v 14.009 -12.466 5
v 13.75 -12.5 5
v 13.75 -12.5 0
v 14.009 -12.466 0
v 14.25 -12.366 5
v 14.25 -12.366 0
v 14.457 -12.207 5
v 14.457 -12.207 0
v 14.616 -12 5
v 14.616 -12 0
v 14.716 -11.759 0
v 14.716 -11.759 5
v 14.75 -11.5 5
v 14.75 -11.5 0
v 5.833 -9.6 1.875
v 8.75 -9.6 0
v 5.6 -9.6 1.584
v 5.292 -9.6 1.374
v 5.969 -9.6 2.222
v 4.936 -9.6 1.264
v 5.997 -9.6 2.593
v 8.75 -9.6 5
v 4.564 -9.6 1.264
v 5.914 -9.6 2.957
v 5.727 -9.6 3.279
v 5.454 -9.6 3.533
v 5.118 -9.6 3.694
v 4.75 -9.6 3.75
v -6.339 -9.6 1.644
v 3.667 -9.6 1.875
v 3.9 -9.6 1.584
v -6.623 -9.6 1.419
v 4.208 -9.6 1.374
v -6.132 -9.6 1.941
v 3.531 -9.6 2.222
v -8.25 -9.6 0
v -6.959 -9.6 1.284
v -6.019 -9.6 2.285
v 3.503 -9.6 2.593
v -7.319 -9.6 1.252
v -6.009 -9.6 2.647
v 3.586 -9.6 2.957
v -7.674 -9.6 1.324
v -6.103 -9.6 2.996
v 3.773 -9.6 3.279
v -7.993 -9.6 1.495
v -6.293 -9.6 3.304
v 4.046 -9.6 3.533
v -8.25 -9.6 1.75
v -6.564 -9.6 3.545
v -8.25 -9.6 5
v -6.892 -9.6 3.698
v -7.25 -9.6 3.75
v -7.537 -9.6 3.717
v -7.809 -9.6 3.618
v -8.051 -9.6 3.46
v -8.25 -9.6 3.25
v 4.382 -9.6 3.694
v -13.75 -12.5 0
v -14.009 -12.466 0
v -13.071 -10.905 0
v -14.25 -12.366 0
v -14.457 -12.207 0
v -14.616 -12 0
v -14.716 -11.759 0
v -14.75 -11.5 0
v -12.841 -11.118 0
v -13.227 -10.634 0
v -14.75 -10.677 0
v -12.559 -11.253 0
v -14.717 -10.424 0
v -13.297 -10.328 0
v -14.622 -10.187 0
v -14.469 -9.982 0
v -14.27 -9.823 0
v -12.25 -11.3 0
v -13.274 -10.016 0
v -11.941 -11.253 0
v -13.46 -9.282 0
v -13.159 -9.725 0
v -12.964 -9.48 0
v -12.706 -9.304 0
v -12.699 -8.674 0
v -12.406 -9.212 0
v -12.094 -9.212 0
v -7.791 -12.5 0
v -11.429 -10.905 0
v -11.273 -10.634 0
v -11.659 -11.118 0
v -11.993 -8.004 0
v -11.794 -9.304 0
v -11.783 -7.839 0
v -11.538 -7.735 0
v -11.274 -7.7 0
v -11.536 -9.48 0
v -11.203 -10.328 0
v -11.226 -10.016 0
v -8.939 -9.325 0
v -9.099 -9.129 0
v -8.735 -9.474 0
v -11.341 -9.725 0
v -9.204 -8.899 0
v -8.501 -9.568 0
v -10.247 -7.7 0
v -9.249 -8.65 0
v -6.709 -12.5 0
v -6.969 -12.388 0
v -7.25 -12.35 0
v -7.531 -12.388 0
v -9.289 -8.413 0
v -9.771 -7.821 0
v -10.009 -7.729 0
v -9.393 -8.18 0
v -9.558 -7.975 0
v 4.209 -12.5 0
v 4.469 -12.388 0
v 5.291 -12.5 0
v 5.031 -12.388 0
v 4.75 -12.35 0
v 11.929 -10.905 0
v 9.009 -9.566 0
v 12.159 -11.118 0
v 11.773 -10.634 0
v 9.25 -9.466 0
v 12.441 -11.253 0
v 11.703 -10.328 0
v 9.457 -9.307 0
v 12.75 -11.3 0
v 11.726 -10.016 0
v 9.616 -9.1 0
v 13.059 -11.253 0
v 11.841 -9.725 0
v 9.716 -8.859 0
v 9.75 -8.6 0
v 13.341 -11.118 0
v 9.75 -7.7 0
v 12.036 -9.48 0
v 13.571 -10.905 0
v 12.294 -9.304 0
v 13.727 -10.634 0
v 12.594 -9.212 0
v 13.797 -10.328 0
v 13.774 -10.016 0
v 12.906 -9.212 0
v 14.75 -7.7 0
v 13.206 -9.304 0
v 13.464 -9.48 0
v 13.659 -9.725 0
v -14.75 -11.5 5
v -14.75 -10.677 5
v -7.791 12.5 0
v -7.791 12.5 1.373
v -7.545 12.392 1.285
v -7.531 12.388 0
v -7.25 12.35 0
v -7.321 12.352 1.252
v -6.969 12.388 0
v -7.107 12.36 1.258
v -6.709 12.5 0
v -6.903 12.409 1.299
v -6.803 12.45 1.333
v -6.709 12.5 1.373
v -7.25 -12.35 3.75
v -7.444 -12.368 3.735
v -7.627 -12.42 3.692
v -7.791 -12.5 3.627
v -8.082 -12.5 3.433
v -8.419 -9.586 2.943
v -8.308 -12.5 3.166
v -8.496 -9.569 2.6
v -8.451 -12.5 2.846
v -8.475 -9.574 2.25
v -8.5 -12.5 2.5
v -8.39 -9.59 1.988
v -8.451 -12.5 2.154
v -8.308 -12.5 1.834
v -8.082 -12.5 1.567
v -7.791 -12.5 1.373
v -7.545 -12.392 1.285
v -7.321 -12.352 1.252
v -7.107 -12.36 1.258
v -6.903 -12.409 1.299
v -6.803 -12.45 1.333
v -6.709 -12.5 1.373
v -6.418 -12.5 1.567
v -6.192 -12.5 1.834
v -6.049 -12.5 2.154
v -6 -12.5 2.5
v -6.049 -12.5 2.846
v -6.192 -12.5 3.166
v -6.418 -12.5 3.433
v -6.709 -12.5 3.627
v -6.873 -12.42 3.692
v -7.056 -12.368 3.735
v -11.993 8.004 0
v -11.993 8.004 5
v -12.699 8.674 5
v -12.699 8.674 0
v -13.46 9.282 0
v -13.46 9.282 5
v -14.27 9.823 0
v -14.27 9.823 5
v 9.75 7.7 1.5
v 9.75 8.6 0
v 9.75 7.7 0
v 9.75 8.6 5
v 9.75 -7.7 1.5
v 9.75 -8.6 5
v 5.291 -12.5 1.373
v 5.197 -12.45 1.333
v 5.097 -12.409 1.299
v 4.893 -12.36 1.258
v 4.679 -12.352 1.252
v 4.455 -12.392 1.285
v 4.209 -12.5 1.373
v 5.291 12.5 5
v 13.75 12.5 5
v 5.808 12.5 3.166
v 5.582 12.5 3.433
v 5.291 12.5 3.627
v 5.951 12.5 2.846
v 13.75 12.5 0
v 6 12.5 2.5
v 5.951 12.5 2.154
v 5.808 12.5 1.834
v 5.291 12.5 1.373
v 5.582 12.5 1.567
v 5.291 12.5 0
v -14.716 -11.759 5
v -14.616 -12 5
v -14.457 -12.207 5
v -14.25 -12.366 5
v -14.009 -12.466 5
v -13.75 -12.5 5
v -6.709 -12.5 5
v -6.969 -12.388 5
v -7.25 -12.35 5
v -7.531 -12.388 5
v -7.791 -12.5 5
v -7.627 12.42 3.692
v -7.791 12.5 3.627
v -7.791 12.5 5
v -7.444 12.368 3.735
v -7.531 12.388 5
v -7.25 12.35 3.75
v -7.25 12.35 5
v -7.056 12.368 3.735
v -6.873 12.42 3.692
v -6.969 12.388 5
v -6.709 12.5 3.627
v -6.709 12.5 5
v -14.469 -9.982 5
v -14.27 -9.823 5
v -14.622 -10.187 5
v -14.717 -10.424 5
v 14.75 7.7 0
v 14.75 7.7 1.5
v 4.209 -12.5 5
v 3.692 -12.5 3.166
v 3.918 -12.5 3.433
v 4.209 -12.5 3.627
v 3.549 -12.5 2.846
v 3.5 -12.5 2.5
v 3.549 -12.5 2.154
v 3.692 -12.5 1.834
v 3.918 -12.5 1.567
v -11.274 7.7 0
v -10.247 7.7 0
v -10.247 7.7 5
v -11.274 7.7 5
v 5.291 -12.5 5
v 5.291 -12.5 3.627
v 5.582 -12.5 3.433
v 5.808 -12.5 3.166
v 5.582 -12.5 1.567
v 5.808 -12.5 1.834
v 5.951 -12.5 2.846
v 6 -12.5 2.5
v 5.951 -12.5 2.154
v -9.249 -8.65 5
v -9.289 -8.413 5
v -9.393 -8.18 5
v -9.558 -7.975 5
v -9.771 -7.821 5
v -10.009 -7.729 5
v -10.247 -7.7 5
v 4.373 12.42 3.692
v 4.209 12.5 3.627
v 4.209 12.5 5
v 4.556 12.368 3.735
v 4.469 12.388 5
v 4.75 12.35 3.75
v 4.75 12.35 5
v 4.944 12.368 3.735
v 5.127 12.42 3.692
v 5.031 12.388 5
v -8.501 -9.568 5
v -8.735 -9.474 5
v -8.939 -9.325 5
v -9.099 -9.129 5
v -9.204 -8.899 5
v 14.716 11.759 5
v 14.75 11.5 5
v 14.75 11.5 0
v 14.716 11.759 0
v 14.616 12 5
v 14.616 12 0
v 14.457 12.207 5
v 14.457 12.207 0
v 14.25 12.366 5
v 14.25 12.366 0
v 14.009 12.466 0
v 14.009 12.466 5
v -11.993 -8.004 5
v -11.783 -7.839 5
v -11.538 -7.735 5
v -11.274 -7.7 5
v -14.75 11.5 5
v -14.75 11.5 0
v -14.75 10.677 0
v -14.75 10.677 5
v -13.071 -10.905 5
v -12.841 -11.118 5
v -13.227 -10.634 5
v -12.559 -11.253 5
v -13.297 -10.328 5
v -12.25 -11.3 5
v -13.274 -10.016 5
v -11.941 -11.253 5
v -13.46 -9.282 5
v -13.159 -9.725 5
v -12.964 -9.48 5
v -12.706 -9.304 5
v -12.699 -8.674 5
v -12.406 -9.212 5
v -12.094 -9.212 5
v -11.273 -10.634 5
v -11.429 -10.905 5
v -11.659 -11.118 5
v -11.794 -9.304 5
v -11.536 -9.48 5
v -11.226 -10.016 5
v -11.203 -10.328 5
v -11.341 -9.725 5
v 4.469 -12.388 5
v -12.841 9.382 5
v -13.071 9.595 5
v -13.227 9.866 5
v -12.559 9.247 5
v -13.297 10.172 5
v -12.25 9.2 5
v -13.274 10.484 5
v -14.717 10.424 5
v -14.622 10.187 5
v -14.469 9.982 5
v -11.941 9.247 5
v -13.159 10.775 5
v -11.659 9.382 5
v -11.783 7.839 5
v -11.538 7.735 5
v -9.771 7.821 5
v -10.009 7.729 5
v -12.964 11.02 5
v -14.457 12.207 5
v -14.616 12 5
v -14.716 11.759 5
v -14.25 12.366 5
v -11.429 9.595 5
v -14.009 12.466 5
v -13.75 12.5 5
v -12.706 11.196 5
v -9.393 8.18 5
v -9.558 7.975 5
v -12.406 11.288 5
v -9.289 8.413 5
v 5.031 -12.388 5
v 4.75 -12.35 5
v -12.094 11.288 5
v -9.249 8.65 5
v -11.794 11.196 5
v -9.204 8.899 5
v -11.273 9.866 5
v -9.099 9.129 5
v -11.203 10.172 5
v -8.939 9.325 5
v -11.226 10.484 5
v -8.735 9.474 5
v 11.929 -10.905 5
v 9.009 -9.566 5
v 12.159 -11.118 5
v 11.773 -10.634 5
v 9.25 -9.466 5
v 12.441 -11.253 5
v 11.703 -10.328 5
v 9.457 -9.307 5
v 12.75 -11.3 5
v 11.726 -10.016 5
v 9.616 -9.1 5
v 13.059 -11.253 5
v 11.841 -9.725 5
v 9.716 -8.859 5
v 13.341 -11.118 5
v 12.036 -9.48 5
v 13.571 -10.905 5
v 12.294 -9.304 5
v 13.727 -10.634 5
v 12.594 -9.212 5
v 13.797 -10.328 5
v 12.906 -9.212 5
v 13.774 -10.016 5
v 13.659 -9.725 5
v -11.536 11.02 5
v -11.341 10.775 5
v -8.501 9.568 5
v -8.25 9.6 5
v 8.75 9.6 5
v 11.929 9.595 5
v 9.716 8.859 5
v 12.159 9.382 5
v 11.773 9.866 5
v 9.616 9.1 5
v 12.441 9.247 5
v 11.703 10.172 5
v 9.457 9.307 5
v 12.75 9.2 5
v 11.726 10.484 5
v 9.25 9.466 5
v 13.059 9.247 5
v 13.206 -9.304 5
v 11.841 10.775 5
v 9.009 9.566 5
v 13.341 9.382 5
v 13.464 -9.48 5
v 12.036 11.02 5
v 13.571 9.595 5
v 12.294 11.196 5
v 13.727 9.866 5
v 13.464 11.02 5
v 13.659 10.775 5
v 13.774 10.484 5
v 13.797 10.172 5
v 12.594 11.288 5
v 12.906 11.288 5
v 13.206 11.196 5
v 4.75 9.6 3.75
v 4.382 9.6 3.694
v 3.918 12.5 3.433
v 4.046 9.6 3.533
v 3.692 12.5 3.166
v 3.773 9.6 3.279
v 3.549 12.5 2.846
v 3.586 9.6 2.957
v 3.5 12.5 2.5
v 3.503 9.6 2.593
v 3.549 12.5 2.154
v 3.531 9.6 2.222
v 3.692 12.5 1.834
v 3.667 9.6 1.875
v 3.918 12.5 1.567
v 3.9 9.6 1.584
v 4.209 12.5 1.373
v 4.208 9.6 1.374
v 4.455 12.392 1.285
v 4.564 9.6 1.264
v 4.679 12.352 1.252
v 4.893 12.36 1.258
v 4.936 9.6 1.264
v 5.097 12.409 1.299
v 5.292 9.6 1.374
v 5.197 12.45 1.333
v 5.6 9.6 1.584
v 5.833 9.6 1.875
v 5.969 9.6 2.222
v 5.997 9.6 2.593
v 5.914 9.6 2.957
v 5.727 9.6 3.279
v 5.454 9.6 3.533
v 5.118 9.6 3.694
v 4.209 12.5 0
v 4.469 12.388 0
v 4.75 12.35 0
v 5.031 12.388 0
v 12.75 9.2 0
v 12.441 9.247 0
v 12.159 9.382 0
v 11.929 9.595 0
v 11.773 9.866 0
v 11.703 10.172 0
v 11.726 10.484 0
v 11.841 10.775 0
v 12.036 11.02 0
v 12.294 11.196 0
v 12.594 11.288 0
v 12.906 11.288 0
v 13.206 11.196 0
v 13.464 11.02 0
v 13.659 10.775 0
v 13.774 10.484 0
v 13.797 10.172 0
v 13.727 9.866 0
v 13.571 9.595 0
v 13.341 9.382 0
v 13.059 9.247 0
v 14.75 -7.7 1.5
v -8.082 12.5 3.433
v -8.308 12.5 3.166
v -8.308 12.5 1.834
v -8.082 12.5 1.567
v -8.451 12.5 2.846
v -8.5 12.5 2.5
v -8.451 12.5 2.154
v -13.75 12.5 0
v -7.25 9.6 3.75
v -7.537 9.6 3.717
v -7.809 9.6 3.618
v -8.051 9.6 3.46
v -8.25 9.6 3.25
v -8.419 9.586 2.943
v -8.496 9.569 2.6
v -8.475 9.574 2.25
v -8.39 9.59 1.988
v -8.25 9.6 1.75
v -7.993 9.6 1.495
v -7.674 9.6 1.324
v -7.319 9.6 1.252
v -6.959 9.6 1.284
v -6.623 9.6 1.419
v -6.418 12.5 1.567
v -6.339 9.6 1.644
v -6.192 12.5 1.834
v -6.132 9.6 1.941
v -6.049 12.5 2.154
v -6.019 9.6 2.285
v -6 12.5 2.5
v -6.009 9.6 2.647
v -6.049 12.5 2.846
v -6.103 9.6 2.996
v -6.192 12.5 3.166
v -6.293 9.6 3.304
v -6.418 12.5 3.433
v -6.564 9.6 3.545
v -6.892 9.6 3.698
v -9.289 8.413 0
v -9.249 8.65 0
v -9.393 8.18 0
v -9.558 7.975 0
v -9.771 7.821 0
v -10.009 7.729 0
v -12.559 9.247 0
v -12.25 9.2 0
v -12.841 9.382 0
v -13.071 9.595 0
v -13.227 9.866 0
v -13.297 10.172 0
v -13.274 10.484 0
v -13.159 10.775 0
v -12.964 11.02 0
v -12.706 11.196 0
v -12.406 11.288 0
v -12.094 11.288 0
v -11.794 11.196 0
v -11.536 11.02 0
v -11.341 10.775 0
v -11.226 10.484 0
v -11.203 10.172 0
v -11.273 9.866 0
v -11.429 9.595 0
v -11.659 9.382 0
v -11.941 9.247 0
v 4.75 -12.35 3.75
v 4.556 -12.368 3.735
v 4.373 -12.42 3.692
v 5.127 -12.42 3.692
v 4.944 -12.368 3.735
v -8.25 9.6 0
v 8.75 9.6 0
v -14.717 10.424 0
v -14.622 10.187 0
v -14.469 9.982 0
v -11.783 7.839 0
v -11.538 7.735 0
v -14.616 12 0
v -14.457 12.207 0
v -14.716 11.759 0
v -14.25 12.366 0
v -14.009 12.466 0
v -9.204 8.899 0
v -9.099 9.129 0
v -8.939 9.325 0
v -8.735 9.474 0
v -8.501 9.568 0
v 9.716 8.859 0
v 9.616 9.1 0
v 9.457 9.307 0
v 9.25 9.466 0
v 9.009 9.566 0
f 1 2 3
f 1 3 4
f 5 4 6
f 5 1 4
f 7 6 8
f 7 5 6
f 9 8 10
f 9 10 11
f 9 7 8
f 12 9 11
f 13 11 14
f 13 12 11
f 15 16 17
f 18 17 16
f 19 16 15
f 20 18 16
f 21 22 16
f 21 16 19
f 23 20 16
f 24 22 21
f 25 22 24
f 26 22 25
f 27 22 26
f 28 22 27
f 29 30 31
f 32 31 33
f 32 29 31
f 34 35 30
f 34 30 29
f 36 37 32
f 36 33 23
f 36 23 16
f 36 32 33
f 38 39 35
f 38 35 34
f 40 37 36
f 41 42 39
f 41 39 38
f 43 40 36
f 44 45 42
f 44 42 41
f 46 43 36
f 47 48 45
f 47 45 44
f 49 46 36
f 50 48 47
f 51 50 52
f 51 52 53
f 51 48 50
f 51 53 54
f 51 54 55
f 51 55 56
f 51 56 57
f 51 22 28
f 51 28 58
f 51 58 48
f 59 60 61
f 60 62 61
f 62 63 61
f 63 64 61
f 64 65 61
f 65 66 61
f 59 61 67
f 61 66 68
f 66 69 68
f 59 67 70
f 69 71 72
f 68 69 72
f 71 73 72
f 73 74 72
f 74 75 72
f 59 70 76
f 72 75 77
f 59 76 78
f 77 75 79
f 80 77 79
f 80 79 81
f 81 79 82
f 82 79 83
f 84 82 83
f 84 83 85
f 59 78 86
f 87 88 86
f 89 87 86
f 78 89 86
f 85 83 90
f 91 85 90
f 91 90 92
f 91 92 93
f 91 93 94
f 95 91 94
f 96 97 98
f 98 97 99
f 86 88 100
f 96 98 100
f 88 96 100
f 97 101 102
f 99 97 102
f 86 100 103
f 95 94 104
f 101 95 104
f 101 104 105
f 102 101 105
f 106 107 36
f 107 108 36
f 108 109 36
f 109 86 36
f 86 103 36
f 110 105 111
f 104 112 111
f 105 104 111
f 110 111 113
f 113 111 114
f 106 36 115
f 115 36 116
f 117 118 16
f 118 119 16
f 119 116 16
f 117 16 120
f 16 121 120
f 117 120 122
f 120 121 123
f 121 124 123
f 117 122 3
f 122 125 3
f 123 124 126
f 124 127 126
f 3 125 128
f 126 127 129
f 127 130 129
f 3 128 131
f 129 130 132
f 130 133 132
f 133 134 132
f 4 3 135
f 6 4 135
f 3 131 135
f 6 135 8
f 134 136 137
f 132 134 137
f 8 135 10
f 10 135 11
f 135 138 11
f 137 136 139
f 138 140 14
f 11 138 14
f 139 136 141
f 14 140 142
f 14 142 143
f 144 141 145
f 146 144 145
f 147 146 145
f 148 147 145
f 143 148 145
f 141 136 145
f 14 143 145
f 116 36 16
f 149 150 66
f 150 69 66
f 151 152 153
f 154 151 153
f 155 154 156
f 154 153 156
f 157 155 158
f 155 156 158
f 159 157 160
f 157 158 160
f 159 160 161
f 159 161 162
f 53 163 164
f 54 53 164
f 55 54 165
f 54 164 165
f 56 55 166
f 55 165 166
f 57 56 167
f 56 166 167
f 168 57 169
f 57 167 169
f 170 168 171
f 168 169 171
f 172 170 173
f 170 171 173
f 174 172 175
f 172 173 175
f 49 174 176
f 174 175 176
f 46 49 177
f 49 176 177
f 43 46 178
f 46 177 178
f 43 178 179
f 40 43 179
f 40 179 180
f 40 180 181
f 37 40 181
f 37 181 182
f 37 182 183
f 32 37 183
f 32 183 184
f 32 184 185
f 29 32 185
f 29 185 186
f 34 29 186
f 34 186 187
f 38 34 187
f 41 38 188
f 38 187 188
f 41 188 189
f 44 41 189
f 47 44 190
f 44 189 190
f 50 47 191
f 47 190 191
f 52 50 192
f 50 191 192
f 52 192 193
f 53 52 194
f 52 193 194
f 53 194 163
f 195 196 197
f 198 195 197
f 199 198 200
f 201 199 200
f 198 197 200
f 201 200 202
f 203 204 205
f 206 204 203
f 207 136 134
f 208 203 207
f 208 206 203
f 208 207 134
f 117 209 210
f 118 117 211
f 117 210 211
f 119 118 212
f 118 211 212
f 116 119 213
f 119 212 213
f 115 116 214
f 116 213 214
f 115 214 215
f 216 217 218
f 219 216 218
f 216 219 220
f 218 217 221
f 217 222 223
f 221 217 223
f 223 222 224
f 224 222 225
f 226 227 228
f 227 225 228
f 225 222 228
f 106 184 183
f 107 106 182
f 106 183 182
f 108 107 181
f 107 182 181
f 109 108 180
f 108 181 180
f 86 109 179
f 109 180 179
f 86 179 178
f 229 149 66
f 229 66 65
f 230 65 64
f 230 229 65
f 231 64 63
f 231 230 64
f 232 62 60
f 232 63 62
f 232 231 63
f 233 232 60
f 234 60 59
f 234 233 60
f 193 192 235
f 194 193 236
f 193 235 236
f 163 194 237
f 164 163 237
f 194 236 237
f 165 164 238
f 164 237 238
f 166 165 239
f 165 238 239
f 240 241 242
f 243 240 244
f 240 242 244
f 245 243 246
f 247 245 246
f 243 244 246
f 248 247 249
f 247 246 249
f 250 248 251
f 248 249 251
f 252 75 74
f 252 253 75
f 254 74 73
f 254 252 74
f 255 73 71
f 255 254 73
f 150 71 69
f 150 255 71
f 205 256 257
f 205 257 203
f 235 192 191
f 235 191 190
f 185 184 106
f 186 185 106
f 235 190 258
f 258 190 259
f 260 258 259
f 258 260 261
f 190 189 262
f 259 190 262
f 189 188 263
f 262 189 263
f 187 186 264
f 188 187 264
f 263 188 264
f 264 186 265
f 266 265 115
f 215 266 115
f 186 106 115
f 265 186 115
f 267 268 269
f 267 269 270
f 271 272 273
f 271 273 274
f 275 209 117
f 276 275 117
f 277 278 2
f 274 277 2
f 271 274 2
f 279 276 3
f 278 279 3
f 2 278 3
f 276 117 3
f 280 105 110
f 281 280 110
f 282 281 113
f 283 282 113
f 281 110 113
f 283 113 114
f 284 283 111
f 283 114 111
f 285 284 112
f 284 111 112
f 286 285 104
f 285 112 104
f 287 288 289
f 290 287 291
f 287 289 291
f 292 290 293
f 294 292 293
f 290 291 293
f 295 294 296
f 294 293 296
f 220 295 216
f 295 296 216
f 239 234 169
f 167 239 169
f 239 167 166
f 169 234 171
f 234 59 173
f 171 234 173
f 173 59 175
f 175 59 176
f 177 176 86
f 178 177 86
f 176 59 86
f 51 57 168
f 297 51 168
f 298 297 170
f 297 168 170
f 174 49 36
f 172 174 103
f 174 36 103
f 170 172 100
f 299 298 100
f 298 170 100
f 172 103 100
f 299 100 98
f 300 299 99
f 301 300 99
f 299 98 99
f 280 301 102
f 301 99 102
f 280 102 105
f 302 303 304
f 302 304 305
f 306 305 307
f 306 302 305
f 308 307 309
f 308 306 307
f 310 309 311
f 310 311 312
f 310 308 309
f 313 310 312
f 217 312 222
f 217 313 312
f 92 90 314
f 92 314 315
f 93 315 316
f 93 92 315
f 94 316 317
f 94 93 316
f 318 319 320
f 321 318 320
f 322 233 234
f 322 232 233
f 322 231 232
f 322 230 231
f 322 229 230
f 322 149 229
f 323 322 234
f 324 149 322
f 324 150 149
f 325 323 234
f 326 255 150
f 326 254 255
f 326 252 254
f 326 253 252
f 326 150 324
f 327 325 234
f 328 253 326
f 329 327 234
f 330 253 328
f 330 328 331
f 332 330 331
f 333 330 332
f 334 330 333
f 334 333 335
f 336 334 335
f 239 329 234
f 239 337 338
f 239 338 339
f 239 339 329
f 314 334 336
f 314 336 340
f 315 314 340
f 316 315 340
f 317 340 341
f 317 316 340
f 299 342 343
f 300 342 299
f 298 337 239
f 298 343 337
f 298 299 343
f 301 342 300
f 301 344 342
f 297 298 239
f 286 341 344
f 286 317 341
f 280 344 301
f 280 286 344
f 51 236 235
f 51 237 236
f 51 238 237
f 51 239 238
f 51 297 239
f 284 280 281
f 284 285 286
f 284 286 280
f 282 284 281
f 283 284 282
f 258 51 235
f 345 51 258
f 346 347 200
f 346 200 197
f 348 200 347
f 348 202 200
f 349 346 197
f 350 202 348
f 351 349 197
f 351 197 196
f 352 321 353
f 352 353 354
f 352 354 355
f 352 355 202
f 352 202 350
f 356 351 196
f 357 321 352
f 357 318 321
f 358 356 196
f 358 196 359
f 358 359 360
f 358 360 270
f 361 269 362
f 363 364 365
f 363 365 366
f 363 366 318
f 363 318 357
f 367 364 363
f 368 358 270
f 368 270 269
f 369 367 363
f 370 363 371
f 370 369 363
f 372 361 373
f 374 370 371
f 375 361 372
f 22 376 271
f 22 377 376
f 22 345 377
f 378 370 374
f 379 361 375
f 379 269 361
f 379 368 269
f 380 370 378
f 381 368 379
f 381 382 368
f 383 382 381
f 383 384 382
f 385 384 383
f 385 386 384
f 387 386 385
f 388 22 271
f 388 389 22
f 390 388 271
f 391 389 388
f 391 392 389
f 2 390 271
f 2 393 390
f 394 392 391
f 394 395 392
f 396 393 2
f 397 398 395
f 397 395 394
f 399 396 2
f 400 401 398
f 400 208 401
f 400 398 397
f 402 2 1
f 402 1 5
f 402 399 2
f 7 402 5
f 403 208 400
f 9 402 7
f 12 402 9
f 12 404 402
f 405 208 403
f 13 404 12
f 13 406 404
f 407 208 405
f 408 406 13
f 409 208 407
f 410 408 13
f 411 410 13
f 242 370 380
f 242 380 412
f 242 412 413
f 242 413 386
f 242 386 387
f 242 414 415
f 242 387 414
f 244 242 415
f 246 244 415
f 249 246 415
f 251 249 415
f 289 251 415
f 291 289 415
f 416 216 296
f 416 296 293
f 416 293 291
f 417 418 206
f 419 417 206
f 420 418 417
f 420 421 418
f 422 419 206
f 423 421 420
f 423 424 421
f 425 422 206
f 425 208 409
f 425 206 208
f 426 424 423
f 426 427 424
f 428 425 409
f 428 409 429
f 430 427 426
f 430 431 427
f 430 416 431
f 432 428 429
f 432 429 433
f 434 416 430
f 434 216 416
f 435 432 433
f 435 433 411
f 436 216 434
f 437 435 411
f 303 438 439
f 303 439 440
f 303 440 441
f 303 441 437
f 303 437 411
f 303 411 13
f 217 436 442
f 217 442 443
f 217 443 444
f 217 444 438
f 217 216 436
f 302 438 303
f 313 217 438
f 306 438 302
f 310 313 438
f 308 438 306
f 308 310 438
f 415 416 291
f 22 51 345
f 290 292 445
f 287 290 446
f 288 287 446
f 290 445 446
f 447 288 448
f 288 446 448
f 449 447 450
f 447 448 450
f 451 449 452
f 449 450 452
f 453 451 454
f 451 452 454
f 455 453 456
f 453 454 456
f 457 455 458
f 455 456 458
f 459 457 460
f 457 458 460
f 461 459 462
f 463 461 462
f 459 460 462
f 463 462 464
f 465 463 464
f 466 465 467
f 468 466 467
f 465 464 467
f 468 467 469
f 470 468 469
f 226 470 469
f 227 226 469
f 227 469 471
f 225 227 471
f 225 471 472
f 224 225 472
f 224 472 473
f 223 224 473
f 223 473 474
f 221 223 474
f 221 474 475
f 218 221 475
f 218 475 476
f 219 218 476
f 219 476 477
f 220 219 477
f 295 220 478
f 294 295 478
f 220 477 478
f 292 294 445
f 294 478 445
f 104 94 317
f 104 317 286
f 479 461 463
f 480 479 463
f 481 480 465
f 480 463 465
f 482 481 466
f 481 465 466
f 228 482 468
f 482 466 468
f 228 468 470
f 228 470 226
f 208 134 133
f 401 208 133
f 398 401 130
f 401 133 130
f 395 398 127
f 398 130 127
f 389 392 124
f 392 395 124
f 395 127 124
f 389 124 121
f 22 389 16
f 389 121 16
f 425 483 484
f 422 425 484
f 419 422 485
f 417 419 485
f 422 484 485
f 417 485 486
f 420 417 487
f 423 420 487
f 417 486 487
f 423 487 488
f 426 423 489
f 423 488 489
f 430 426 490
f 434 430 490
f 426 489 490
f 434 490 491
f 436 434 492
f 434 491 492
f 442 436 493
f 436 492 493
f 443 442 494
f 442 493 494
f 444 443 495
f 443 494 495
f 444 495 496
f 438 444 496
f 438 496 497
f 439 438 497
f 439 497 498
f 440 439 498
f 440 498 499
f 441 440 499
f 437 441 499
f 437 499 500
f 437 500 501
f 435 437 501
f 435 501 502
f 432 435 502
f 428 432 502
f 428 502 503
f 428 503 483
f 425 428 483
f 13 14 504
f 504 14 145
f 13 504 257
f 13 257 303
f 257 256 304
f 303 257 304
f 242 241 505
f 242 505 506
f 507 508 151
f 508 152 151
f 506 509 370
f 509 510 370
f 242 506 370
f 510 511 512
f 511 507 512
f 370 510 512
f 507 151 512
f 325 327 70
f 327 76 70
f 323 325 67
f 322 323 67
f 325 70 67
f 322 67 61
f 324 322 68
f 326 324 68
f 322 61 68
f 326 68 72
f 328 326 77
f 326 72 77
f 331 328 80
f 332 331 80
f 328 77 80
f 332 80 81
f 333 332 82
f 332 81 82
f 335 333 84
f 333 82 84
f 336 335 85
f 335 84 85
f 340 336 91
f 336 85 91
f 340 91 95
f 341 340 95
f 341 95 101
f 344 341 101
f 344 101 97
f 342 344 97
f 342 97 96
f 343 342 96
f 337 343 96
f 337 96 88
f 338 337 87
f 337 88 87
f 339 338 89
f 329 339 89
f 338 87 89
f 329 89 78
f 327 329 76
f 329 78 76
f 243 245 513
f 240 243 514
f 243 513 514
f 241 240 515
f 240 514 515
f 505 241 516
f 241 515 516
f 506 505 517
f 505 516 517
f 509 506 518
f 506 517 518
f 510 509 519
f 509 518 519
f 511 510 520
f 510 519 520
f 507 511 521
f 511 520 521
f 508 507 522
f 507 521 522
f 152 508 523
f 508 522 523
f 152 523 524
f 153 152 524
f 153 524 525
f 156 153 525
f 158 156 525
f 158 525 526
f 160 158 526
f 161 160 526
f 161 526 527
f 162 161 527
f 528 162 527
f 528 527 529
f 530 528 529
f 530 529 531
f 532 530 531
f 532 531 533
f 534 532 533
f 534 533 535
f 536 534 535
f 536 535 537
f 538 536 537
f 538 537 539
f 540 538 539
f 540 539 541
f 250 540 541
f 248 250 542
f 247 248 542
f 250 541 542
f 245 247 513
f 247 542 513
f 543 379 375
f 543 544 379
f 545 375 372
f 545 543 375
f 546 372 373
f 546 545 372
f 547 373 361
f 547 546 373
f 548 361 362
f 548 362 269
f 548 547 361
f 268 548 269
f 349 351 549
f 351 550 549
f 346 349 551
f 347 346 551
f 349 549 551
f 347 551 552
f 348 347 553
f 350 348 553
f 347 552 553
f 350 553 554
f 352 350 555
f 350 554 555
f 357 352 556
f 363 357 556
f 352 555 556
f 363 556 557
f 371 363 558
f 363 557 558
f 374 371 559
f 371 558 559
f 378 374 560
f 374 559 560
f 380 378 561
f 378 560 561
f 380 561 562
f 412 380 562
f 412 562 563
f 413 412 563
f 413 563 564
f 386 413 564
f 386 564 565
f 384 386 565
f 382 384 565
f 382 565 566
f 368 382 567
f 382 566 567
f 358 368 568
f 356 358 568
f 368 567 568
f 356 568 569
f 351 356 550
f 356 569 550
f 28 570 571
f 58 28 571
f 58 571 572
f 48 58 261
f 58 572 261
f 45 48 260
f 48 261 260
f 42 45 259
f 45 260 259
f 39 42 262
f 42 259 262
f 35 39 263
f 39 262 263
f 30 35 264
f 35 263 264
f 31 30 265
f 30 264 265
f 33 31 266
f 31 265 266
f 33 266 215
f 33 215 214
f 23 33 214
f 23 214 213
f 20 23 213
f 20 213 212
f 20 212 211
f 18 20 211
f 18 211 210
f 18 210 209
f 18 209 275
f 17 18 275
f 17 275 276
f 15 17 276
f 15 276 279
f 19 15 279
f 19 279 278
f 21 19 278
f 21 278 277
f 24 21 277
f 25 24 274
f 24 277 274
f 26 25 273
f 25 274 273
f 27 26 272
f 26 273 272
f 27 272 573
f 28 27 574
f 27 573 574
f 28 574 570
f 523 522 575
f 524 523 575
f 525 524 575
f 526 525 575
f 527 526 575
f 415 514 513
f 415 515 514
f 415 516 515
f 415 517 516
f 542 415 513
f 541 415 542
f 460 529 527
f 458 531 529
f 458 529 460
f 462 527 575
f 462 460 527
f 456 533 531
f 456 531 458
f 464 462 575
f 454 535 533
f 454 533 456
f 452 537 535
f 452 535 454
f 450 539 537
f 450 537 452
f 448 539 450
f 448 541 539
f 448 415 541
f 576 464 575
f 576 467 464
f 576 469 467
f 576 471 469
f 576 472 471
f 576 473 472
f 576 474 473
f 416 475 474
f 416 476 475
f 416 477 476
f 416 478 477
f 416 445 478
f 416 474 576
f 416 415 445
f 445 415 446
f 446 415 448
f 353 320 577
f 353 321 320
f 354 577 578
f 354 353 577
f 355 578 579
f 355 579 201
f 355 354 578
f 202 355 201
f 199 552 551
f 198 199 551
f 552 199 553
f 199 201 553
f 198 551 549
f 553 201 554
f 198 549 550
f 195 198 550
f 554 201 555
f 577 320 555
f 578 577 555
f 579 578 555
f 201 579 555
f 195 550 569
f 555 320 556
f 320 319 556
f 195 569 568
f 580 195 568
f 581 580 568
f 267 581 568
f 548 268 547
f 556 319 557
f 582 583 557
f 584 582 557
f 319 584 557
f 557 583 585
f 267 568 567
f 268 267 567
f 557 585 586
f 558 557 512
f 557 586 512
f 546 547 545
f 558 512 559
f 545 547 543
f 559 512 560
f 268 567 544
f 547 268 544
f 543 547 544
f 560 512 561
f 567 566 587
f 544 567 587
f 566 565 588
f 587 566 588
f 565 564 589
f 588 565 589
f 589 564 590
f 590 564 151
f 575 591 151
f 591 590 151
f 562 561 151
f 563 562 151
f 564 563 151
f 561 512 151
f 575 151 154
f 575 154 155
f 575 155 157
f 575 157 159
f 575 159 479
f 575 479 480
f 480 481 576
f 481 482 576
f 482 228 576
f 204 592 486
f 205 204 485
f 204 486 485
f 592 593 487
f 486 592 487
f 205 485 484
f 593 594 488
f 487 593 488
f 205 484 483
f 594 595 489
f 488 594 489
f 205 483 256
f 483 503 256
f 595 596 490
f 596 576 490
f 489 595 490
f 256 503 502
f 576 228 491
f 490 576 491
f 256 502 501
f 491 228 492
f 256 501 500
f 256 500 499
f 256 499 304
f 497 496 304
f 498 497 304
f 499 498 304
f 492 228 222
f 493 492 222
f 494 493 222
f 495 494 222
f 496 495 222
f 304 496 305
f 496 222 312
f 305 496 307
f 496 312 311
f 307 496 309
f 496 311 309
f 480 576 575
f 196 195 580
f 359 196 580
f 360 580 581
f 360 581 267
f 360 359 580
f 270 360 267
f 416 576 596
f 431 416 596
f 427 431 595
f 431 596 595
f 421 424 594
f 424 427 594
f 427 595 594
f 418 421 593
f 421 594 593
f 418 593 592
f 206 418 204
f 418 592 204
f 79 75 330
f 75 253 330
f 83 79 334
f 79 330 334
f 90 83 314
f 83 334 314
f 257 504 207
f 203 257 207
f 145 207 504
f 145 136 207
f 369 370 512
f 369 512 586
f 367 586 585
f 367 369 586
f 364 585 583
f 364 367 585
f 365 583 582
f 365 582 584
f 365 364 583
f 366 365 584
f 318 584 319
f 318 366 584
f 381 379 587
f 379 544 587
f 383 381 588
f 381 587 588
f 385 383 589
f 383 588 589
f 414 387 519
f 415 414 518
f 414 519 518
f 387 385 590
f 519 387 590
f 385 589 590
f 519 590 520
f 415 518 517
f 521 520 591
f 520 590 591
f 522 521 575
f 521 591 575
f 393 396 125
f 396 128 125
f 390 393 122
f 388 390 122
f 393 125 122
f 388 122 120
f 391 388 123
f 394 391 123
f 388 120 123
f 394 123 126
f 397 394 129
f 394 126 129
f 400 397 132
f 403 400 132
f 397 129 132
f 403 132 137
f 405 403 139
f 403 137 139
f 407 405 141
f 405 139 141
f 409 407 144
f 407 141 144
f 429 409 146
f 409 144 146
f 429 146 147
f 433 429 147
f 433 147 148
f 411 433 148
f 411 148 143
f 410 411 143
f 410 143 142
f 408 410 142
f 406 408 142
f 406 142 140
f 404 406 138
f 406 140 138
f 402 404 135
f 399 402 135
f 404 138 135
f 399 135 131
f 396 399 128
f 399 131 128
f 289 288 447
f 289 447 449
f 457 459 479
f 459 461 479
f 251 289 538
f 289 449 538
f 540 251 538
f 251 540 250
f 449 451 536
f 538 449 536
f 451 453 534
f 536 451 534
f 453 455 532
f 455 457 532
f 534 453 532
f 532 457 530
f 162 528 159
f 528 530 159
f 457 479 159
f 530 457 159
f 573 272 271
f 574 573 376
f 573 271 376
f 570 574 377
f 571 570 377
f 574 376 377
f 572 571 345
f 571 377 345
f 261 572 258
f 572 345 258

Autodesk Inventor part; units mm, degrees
ref_plane "YZ Plane" through (0, 0, 0) normal (1, 0, 0) x (0, 1, 0)
ref_plane "XZ Plane" through (0, 0, 0) normal (0, 1, 0) x (-1, 0, 0)
ref_plane "XY Plane" through (0, 0, 0) normal (0, 0, 1) x (1, 0, 0)
sketch "スケッチ1" plane through (0, 0, 0) normal (0, 0, 1) x (1, 0, 0)
  line L0 (-14.75, -12.5) -> (14.75, -12.5)
  line L1 (14.75, -12.5) -> (14.75, 12.5)
  line L2 (14.75, 12.5) -> (-14.75, 12.5)
  line L3 (-14.75, 12.5) -> (-14.75, -12.5)
  line L4 (-14.75, -12.5) -> (14.75, 12.5) construction
  line L5 (14.75, -12.5) -> (-14.75, 12.5) construction
  point P0 (0, 0)
  dimension "d0" = 29.5
  dimension "d1" = 25
extrude "プレート1" add sketch "スケッチ1" along normal blind 5
sketch "スケッチ2" plane through (0, 0, 5) normal (0, 0, 1) x (1, 0, 0)
  line L0 (-12.25, -10.25) -> (12.75, -10.25) construction
  line L1 (12.75, -10.25) -> (12.75, 10.25) construction
  line L2 (12.75, 10.25) -> (-12.25, 10.25) construction
  line L3 (-12.25, 10.25) -> (-12.25, -10.25) construction
  line L4 (-12.25, -10.25) -> (12.75, 10.25) construction
  line L5 (12.75, -10.25) -> (-12.25, 10.25) construction
  line L6 (14.75, 12.5) -> (14.75, -12.5) construction
  point P0 (0, 0)
  point P1 (0.25, 0)
  dimension "d3" = 25
  dimension "d4" = 20.5
  dimension "d5" = 2
hole "穴1" at (-12.25, 10.25, 5) at (12.75, 10.25, 5) at (12.75, -10.25, 5) at (-12.25, -10.25, 5) direction (0, 0, -1) diameter 2.1 end through all
sketch "スケッチ3" plane through (0, 0, 0) normal (0, 0, -1) x (-1, 0, 0)
  line L0 (-14.75, -12.5) -> (-14.75, 12.5) projected
  line L1 (14.75, 12.5) -> (14.75, -12.5) projected
  line L2 (-14.75, 7.7) -> (14.75, 7.7)
  line L3 (14.75, -7.7) -> (-14.75, -7.7)
  line L4 (-14.75, 12.5) -> (14.75, 12.5) projected
  line L5 (14.75, -12.5) -> (-14.75, -12.5) projected
  point P0 (0, 0)
  dimension "d13" = 4.8
  dimension "d14" = 4.8
extrude "押し出し1" cut sketch "スケッチ3" against normal blind 1.5 contours L0 L2 L1 L3
sketch "スケッチ4" plane through (0, 0, 5) normal (0, 0, 1) x (1, 0, 0)
  line L0 (-14.75, 12.5) -> (14.75, 12.5) projected
  line L1 (14.75, -12.5) -> (-14.75, -12.5) projected
  circle A0 centre (-20.25, 0) radius 11.5
  line L2 (14.75, 12.5) -> (14.75, -12.5) projected
  line L3 (9.75, -9.6) -> (-9.25, -9.6)
  line L4 (-9.25, -9.6) -> (-9.25, 9.6)
  line L5 (-9.25, 9.6) -> (9.75, 9.6)
  line L6 (9.75, 9.6) -> (9.75, -9.6)
  line L7 (9.75, -9.6) -> (-9.25, 9.6) construction
  line L8 (-9.25, -9.6) -> (9.75, 9.6) construction
  line L9 (-9.25, 7.7) -> (-11.7083, 7.7)
  line L10 (-11.7083, 7.7) -> (-11.7083, -7.7)
  line L11 (-11.7083, -7.7) -> (-9.25, -7.7)
  line L12 (-9.25, -7.7) -> (-9.25, 7.7)
  line L13 (14.75, 7.7) -> (-14.75, 7.7) projected
  point P0 (0, 0)
  point P1 (14.75, 0)
  point P2 (0.25, 0)
  point P3 (-9.25, 0)
  point P4 (-11.7083, 7.7)
  dimension "d18" = 23
  dimension "d17" = 35
  dimension "d19" = 5
  dimension "d20" = 2.9
  dimension "d22" = 19
extrude "押し出し2" cut sketch "スケッチ4" against normal through all
fillet "フィレット1" radius 1 14 edges at (-9.25, 9.6, 2.5) (-9.25, -9.6, 2.5) (9.75, -9.6, 2.5) (9.75, 9.6, 2.5) (-9.25, 7.7, 2.5) (-9.25, -7.7, 2.5) (-11.7083, -7.7, 2.5) (-11.7083, 7.7, 2.5) (-14.75, -10.0995, 2.5) (-14.75, 10.0995, 2.5) (-14.75, -12.5, 2.5) (14.75, -12.5, 2.5) (14.75, 12.5, 2.5) (-14.75, 12.5, 2.5)
sketch "スケッチ5" plane through (0, 0, 5) normal (0, 0, 1) x (1, 0, 0)
  line L0 (-13.75, 12.5) -> (13.75, 12.5) projected
  circle A0 centre (-7.25, 13.4) radius 1.05
  circle A1 centre (4.75, 13.4) radius 1.05
  line L1 (14.75, 11.5) -> (14.75, -11.5) projected
  point P0 (0, 0)
  dimension "d26" = 2.1
  dimension "d27" = 2.1
  dimension "d28" = 0.9
  dimension "d29" = 0.9
  dimension "d30" = 12
  dimension "d31" = 10
extrude "押し出し3" cut sketch "スケッチ5" against normal through all
sketch "スケッチ6" plane through (-6.7092, 12.5, 0) normal (0, 1, 0) x (1, 0, 0)
  line L0 (-1.0817, -5) -> (-1.0817, 0) projected
  line L1 (0, -5) -> (-1.0817, -5) projected
  line L2 (0, 0) -> (0, -5) projected
  line L3 (-1.0817, 0) -> (0, 0) projected
  line L4 (10.9183, -5) -> (10.9183, 0) projected
  line L5 (12, -5) -> (10.9183, -5) projected
  line L6 (12, 0) -> (12, -5) projected
  line L7 (10.9183, 0) -> (12, 0) projected
  line L8 (-1.5408, -5) -> (-1.5408, 0) construction
  line L9 (-1.5408, 0) -> (-1.5408, -5) construction
  line L10 (-1.0817, -2.5) -> (0, -2.5) construction
  line L11 (10.9183, -2.5) -> (12, -2.5) construction
  line L12 (11.4592, -5) -> (11.4592, 0) construction
  point P0 (6.7092, 0)
  point P1 (-0.5408, -2.5)
  point P2 (11.4592, -2.5)
hole "穴2" at (-7.25, 12.5, 2.5) at (4.75, 12.5, 2.5) direction (0, -1, 0) diameter 2.5 end through all
mirror "ミラー1" about plane through (0, 0, 0) normal (0, 1, 0) of "穴2", "押し出し3"
equation "\"d11\" = Thickness"
equation "\"d14\" = d13"
equation "\"d29\" = d28"
equation "\"d2\" = Thickness"
equation "\"BendRadius\" = Thickness"
equation "\"BendReliefWidth\" = Thickness"
equation "\"BendReliefDepth\" = 0.5 * Thickness"
equation "\"TransitionRadius\" = BendRadius"
equation "\"JacobiRadiusSize\" = BendRadius"
equation "\"GapSize\" = Thickness"
equation "\"Thickness\" = 5"
properties part number "T3.0_servo-mount_3D プリント"
